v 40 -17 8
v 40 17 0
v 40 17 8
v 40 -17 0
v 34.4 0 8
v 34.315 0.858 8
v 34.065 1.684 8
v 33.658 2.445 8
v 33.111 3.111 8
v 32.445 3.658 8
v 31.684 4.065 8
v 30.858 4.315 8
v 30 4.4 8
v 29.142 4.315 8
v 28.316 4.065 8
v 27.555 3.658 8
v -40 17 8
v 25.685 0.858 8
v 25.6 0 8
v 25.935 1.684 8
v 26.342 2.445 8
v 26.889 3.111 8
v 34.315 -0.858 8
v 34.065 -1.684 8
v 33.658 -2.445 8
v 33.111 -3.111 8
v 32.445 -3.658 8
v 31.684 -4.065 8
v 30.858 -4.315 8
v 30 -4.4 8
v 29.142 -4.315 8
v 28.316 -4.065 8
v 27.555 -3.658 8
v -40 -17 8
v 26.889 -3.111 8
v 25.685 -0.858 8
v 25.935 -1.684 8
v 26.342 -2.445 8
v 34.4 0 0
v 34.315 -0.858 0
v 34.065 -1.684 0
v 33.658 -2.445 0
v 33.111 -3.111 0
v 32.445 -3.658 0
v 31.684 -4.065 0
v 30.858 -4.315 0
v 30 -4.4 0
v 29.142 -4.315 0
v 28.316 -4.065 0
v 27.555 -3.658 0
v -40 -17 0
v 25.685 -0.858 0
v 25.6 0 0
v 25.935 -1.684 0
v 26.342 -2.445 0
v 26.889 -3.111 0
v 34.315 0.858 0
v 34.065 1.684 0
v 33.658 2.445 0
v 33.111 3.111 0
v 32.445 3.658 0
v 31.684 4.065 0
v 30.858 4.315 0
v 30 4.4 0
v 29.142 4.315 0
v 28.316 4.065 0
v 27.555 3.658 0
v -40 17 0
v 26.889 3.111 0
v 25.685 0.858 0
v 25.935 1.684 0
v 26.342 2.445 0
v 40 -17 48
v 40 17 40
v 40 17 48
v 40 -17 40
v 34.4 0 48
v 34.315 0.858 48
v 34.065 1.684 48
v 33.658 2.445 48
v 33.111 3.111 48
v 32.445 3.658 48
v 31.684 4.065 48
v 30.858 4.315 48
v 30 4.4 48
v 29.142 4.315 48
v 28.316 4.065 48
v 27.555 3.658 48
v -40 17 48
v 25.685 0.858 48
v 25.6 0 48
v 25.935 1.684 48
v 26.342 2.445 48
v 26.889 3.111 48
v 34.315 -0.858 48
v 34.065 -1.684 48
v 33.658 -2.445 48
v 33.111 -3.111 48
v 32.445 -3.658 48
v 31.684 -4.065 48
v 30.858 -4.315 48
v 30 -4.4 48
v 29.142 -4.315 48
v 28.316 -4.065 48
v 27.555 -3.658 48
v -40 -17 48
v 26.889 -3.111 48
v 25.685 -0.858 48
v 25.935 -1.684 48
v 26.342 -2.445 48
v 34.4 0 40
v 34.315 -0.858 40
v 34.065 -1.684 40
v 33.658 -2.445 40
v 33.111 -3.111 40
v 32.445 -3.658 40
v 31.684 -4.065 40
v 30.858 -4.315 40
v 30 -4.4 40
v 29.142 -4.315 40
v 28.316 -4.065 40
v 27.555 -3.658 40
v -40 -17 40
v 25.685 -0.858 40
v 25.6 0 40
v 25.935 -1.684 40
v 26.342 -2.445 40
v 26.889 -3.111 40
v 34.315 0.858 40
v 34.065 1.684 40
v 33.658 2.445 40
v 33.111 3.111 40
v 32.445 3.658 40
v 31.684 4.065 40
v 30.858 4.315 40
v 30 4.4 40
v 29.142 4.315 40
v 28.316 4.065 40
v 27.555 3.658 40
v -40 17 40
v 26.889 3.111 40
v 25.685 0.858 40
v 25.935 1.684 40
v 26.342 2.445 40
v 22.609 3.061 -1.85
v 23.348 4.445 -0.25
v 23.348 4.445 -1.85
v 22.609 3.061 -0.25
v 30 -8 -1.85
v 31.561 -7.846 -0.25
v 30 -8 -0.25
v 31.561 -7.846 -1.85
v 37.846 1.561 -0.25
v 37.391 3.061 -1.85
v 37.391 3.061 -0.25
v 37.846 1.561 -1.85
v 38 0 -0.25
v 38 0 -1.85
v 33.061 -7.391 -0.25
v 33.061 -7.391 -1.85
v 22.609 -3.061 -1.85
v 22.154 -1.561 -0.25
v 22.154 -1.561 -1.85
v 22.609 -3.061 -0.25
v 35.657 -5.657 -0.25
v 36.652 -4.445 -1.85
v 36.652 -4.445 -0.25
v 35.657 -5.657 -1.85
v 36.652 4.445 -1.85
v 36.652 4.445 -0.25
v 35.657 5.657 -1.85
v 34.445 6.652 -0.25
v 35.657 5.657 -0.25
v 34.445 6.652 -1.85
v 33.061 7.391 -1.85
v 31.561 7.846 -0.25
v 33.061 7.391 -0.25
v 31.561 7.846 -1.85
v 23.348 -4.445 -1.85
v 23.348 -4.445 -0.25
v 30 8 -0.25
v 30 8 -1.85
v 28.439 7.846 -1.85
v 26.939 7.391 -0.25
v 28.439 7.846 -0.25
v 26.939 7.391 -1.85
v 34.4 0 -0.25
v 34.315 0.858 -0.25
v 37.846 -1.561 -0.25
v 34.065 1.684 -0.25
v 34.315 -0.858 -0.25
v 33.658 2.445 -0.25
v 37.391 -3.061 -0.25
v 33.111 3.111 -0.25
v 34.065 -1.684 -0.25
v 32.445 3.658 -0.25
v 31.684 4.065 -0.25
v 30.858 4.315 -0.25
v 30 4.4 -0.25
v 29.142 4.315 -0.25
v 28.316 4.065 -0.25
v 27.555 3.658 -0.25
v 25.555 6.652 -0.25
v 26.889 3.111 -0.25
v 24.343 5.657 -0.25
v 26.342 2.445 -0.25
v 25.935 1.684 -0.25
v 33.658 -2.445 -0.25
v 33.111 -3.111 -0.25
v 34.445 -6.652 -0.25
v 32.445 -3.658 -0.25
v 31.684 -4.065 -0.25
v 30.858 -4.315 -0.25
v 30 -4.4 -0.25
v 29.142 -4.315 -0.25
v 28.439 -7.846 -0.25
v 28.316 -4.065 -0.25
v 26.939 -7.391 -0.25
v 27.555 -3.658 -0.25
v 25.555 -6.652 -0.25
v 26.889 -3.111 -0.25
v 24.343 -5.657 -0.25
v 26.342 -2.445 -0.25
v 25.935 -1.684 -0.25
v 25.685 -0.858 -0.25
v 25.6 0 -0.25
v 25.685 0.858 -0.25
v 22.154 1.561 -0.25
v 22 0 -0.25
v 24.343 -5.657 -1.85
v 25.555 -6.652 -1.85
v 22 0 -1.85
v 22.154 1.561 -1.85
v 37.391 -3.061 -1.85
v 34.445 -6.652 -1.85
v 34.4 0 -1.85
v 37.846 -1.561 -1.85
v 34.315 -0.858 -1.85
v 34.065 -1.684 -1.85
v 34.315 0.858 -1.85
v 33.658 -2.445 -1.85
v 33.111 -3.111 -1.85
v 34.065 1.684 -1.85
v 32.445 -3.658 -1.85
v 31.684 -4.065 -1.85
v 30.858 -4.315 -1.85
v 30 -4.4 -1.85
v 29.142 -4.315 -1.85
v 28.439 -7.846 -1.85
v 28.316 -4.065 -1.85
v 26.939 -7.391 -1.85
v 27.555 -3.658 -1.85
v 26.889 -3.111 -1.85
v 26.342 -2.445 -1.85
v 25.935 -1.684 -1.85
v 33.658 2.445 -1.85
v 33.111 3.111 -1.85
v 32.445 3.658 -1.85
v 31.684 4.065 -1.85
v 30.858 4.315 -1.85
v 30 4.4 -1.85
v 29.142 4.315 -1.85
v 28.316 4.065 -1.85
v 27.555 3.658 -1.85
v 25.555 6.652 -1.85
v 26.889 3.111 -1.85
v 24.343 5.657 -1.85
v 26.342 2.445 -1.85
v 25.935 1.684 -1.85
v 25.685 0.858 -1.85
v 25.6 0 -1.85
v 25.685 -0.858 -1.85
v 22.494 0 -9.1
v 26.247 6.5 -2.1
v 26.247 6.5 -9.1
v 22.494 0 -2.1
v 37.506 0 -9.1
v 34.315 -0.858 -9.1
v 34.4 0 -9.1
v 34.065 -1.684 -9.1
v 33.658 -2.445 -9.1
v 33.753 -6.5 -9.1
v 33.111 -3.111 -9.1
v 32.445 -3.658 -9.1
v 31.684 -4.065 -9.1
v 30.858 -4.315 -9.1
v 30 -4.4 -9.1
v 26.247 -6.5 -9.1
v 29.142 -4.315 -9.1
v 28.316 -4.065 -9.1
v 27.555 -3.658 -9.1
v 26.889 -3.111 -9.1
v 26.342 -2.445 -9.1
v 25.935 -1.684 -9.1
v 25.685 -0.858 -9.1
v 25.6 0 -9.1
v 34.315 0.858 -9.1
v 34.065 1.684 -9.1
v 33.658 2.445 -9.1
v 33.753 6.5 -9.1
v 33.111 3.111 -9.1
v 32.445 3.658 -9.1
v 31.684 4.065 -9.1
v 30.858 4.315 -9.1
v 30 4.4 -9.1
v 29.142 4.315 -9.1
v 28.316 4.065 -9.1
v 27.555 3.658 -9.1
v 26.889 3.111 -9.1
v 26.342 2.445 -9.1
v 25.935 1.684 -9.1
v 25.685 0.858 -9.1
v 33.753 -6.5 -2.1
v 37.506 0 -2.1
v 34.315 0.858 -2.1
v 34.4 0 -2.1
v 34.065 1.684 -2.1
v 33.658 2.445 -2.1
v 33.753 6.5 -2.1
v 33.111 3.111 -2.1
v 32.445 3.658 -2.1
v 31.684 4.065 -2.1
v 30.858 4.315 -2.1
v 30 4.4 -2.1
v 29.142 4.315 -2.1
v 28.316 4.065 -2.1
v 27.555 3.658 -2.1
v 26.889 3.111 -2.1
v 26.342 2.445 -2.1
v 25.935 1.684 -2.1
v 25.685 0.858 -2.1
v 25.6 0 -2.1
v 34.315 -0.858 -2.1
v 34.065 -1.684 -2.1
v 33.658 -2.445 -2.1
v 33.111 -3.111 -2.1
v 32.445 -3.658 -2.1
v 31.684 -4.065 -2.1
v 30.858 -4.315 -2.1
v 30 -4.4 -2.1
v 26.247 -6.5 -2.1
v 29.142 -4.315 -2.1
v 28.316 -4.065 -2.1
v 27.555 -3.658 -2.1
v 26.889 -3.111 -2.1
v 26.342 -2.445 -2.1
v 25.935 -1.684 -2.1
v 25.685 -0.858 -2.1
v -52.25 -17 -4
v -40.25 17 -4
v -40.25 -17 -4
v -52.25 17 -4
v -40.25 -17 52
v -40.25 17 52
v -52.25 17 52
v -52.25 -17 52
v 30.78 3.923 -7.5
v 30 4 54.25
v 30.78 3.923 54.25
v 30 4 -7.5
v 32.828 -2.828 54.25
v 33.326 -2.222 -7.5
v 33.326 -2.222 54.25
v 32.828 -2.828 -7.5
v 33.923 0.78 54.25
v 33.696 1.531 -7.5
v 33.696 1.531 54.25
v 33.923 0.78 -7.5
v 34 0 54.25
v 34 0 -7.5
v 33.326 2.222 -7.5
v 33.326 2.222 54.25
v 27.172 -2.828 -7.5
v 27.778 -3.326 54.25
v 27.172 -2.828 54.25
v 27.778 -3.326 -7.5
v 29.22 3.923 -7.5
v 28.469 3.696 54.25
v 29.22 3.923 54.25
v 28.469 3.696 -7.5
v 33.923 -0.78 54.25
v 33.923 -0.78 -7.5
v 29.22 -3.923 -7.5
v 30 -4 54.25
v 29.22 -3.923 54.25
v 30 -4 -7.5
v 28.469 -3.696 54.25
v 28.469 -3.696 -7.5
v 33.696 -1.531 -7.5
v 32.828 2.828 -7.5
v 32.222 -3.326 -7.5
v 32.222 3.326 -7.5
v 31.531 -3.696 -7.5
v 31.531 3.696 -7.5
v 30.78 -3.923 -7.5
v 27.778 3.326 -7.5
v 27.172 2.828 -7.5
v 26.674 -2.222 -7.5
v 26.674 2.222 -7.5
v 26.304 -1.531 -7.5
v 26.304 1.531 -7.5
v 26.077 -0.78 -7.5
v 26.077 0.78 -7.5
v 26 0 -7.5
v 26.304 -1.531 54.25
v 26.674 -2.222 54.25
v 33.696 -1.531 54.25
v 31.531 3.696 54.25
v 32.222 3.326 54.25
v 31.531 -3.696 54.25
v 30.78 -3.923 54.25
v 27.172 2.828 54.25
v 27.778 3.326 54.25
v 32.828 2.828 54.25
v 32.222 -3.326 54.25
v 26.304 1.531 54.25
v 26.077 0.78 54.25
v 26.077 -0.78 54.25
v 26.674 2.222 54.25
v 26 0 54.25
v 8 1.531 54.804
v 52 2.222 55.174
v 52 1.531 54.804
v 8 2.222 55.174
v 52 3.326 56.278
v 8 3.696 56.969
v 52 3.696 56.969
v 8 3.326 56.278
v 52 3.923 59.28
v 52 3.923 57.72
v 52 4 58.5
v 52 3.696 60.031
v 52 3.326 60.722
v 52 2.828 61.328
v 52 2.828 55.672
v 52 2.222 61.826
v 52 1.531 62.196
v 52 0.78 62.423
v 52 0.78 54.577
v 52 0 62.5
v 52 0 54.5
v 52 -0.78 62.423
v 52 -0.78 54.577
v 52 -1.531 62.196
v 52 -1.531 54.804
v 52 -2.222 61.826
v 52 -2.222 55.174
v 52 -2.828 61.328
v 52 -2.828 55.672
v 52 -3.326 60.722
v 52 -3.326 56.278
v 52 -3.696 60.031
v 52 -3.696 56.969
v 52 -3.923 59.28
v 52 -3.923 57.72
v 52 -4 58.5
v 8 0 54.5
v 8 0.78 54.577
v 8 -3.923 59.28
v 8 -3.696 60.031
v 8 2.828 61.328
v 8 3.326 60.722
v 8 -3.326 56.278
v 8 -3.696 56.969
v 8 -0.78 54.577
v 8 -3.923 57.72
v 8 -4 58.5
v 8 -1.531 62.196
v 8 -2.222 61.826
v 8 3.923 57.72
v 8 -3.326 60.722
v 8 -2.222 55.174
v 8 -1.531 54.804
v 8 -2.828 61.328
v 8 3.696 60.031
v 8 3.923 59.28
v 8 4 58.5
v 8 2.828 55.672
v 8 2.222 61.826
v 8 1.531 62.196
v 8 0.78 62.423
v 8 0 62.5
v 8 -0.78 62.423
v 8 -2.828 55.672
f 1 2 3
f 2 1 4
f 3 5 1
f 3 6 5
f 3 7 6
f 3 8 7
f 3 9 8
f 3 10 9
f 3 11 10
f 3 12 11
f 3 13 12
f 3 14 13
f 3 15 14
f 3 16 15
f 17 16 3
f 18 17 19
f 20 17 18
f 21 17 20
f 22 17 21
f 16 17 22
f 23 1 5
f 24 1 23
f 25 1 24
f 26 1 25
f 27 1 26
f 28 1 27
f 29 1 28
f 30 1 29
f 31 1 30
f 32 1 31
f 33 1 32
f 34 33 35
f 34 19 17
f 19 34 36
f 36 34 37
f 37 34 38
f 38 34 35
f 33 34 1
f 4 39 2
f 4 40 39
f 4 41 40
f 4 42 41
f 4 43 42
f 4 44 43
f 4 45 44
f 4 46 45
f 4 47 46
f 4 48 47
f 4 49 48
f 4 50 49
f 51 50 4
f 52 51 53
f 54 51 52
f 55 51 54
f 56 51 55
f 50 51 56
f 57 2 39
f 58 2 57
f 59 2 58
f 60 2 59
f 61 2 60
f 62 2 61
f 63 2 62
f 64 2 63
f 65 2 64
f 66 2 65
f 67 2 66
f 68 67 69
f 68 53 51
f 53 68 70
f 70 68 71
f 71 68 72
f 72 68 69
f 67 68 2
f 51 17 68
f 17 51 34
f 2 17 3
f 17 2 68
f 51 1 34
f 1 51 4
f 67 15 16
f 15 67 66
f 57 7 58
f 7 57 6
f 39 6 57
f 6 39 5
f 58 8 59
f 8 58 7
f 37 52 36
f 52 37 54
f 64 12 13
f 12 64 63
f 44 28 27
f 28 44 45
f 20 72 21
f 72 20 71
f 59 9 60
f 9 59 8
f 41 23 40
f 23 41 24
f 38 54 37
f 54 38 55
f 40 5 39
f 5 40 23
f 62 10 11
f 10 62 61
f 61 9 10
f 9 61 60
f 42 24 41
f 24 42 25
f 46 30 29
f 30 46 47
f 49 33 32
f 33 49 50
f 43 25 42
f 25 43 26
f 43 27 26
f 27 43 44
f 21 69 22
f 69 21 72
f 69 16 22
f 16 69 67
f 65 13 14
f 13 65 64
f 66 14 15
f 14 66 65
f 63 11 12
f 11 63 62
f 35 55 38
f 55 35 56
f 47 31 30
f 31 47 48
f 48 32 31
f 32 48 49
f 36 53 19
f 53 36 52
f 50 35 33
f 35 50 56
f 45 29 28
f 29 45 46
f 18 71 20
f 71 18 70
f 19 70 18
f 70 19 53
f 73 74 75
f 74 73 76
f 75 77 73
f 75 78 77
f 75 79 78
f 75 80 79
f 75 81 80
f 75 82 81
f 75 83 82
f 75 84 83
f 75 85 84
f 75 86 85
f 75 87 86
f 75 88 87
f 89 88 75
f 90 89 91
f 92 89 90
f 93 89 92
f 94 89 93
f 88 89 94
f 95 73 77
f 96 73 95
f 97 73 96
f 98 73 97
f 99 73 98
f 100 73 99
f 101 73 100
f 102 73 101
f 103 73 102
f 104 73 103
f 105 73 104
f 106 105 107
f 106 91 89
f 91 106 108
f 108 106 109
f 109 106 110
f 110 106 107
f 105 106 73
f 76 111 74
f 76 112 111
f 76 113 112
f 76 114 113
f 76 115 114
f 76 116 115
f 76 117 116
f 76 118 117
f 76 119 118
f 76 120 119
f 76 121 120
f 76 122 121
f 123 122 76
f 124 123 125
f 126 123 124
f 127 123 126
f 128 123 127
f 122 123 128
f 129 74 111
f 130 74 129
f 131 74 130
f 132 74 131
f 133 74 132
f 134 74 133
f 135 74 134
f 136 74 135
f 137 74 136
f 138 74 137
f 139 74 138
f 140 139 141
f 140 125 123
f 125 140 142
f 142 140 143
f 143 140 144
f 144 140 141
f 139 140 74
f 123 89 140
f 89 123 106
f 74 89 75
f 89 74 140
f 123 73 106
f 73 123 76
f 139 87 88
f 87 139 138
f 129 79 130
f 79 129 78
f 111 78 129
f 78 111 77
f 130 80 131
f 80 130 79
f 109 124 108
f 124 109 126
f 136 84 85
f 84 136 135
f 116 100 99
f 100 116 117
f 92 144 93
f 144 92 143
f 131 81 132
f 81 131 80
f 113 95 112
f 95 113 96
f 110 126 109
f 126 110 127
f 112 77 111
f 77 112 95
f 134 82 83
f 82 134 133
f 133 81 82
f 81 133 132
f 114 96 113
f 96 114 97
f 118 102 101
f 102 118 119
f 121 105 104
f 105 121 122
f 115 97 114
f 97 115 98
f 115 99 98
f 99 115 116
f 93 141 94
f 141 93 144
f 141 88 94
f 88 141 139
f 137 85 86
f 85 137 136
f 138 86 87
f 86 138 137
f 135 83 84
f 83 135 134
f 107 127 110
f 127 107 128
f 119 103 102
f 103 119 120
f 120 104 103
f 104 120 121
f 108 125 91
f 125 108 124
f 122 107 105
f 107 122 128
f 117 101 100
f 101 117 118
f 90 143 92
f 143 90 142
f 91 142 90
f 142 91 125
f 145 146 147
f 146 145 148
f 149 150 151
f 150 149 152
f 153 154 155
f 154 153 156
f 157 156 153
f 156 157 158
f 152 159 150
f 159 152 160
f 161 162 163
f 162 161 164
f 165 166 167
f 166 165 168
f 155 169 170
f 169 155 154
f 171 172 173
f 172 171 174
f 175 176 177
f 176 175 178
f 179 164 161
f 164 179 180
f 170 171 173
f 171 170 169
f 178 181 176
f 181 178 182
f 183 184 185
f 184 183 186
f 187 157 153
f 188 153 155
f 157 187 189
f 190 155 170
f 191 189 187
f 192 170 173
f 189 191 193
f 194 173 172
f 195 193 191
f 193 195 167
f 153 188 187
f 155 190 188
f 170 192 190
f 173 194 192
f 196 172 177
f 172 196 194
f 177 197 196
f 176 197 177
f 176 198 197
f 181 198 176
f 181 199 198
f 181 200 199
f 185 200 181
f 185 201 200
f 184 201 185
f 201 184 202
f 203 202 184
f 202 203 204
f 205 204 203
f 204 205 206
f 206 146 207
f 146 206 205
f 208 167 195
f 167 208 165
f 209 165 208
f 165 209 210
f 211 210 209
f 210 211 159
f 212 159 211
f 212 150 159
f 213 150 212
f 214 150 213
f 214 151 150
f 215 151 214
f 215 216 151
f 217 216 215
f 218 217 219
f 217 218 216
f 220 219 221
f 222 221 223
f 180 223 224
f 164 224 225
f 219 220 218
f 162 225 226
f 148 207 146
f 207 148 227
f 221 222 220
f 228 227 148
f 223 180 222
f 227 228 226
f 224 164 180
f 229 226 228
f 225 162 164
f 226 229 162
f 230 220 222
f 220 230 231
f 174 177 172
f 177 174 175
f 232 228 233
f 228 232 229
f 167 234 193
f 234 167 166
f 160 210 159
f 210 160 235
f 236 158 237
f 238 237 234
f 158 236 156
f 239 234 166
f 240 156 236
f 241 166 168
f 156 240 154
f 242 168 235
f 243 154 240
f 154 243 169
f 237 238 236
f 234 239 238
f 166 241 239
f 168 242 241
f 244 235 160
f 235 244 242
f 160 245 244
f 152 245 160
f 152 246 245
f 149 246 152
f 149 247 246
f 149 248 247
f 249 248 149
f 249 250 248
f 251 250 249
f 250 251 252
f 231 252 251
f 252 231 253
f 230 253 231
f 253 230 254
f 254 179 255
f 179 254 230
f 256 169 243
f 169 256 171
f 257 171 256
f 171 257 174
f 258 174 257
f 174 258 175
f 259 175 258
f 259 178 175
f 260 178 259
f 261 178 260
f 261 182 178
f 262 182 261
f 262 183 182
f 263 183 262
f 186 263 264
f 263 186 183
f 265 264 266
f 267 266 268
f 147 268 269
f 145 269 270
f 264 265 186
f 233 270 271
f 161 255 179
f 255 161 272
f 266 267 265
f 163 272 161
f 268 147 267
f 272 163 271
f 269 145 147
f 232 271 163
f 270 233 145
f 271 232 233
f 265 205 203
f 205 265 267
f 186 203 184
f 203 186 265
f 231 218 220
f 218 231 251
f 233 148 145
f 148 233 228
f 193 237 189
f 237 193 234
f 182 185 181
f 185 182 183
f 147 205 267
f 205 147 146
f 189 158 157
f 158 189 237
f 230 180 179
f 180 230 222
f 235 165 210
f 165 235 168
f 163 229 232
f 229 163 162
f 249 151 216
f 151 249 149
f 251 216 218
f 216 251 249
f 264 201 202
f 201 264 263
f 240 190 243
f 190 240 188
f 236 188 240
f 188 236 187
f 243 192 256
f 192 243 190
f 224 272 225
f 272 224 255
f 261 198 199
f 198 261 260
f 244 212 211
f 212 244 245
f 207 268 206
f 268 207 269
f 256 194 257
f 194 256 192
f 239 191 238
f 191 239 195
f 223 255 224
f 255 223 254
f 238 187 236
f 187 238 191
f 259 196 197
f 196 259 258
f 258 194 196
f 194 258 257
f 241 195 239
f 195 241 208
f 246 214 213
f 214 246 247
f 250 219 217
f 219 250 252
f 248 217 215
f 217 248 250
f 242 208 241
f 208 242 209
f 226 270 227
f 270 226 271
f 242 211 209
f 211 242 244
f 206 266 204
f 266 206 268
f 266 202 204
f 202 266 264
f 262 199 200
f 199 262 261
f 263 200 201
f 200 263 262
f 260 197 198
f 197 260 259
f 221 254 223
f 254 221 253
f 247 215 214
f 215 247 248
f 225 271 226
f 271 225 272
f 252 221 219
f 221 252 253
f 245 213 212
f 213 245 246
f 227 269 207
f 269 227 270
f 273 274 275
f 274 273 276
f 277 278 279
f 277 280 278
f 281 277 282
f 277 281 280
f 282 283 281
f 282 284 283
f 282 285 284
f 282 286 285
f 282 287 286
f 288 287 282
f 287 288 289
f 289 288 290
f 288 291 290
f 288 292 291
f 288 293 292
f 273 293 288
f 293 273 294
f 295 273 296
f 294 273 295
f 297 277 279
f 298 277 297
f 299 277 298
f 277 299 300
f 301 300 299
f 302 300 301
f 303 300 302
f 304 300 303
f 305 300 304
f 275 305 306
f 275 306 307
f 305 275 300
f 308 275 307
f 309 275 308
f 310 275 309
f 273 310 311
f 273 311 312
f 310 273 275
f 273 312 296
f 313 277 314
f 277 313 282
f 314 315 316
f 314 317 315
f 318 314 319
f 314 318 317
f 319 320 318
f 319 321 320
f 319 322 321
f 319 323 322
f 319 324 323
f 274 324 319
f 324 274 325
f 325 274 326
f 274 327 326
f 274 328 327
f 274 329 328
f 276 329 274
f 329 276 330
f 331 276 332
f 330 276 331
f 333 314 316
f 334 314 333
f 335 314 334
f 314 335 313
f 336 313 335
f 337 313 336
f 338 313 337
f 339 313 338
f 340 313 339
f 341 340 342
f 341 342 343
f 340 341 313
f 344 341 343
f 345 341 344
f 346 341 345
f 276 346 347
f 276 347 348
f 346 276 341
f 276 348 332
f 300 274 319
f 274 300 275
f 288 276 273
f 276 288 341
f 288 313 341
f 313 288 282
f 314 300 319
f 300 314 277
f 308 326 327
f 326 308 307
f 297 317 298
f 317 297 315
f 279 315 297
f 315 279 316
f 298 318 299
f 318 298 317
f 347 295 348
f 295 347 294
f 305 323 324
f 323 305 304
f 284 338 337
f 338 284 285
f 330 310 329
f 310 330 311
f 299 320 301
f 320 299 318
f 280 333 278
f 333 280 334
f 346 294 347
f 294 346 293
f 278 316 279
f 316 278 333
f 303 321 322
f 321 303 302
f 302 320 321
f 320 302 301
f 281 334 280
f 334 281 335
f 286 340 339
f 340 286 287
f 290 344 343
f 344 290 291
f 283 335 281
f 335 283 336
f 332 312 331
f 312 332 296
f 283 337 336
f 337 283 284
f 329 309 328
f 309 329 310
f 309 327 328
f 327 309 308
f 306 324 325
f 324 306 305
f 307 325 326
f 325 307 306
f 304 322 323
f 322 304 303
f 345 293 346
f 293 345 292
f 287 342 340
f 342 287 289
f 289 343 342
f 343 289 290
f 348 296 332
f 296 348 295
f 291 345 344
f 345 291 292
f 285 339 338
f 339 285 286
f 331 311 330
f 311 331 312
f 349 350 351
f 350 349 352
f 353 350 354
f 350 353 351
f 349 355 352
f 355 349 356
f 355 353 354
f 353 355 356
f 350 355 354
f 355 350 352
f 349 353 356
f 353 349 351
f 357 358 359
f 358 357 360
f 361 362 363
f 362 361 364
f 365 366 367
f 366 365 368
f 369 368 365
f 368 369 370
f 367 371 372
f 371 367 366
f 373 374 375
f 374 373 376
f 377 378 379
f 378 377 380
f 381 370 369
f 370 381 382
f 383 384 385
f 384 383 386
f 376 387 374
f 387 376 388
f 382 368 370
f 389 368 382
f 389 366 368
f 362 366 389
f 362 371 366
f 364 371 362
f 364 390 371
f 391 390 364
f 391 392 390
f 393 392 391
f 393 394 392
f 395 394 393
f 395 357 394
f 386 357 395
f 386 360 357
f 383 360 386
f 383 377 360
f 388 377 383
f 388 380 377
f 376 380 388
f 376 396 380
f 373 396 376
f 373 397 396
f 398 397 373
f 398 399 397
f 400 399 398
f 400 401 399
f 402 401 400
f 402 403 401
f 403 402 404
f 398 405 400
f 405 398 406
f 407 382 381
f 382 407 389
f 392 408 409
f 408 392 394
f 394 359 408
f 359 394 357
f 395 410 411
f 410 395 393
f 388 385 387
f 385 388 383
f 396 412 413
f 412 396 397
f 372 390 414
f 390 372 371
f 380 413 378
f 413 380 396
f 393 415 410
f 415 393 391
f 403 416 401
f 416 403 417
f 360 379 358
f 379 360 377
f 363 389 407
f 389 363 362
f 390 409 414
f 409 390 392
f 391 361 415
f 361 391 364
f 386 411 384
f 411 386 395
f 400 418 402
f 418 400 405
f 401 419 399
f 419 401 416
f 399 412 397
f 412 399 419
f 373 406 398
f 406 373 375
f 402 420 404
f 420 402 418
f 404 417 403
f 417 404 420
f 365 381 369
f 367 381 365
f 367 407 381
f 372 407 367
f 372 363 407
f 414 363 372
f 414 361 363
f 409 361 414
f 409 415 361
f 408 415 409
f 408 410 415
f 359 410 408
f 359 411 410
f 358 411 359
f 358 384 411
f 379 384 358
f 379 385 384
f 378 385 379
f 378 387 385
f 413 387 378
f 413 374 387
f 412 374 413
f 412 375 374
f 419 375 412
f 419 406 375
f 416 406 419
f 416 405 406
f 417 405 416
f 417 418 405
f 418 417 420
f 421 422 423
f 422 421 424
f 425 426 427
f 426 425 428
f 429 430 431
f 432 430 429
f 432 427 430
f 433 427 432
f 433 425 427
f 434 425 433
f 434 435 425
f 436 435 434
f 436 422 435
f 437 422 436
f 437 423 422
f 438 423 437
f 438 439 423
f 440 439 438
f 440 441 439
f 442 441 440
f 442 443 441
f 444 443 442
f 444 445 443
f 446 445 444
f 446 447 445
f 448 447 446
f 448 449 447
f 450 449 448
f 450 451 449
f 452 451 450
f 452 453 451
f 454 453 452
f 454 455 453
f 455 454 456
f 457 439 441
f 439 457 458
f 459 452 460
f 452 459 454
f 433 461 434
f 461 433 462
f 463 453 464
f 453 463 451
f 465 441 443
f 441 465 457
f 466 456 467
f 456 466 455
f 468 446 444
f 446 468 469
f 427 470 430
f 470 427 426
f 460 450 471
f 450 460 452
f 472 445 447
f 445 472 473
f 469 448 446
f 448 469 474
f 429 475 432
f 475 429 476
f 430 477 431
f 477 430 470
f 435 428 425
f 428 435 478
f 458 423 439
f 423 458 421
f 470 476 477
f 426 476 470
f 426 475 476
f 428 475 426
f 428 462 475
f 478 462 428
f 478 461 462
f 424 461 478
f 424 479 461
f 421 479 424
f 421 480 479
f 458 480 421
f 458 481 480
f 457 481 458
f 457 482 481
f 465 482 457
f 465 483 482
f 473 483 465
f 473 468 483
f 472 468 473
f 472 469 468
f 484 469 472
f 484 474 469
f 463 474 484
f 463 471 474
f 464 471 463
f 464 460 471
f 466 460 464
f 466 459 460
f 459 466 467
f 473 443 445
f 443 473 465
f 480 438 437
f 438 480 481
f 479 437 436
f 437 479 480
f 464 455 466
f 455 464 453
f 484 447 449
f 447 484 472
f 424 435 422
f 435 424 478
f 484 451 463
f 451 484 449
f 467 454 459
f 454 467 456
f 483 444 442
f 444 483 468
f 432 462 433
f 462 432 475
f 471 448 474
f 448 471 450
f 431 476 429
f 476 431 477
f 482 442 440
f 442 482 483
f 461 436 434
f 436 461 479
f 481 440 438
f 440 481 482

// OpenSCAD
$fn = 32;

// ------------------------------------------------------------------------
// C clamp: throat 40 mm, screw d8
// Every part is its own module, assembly() places every instance.
// ------------------------------------------------------------------------

// --- part 1 ---
module clamp_arm() {
  difference() {
    translate([-40, -17, 0]) cube([80, 34, 8]);
    translate([30, 0, -1]) cylinder(h = 10, d = 8.8);
  }
}

// --- part 2 ---
module clamp_spine() {
  difference() {
    translate([-28, -17, 0]) cube([56, 34, 12]);
  }
}

// --- part 3 ---
module clamp_screw() {
  translate([0, 0, -30.875]) cylinder(h = 61.75, d = 8);
}

// --- part 4 ---
module clamp_washer() {
  difference() {
      translate([0, 0, 0]) cylinder(h = 1.6, d = 16);
      translate([0, 0, -1]) cylinder(h = 3.6, d = 8.8);
    }
}

// --- part 5 ---
module clamp_nut() {
  difference() {
    linear_extrude(height = 7) polygon(points = [[7.506, 0], [3.753, 6.5], [-3.753, 6.5], [-7.506, 0], [-3.753, -6.5], [3.753, -6.5]]);
    translate([0, 0, -1]) cylinder(h = 9, d = 8.8);
  }
}

// --- part 6 ---
module tommy_bar() {
  translate([0, 0, -22]) cylinder(h = 44, d = 8);
}

// --- assembly ---
module assembly() {
  color([0.80, 0.24, 0.20]) translate([0, 0, 0]) rotate([0, 0, 0]) clamp_arm();
  color([0.20, 0.45, 0.75]) translate([0, 0, 40]) rotate([0, 0, 0]) clamp_arm();
  color([0.25, 0.62, 0.32]) translate([-52.25, 0, 24]) rotate([0, 90, 0]) clamp_spine();
  color([0.92, 0.70, 0.18]) translate([30, 0, 23.375]) rotate([0, 0, 0]) clamp_screw();
  color([0.58, 0.35, 0.70]) translate([30, 0, -1.85]) rotate([0, 0, 0]) clamp_washer();
  color([0.16, 0.66, 0.66]) translate([30, 0, -9.1]) rotate([0, 0, 0]) clamp_nut();
  color([0.85, 0.48, 0.18]) translate([30, 0, 58.5]) rotate([0, 90, 0]) tommy_bar();
}

assembly();
